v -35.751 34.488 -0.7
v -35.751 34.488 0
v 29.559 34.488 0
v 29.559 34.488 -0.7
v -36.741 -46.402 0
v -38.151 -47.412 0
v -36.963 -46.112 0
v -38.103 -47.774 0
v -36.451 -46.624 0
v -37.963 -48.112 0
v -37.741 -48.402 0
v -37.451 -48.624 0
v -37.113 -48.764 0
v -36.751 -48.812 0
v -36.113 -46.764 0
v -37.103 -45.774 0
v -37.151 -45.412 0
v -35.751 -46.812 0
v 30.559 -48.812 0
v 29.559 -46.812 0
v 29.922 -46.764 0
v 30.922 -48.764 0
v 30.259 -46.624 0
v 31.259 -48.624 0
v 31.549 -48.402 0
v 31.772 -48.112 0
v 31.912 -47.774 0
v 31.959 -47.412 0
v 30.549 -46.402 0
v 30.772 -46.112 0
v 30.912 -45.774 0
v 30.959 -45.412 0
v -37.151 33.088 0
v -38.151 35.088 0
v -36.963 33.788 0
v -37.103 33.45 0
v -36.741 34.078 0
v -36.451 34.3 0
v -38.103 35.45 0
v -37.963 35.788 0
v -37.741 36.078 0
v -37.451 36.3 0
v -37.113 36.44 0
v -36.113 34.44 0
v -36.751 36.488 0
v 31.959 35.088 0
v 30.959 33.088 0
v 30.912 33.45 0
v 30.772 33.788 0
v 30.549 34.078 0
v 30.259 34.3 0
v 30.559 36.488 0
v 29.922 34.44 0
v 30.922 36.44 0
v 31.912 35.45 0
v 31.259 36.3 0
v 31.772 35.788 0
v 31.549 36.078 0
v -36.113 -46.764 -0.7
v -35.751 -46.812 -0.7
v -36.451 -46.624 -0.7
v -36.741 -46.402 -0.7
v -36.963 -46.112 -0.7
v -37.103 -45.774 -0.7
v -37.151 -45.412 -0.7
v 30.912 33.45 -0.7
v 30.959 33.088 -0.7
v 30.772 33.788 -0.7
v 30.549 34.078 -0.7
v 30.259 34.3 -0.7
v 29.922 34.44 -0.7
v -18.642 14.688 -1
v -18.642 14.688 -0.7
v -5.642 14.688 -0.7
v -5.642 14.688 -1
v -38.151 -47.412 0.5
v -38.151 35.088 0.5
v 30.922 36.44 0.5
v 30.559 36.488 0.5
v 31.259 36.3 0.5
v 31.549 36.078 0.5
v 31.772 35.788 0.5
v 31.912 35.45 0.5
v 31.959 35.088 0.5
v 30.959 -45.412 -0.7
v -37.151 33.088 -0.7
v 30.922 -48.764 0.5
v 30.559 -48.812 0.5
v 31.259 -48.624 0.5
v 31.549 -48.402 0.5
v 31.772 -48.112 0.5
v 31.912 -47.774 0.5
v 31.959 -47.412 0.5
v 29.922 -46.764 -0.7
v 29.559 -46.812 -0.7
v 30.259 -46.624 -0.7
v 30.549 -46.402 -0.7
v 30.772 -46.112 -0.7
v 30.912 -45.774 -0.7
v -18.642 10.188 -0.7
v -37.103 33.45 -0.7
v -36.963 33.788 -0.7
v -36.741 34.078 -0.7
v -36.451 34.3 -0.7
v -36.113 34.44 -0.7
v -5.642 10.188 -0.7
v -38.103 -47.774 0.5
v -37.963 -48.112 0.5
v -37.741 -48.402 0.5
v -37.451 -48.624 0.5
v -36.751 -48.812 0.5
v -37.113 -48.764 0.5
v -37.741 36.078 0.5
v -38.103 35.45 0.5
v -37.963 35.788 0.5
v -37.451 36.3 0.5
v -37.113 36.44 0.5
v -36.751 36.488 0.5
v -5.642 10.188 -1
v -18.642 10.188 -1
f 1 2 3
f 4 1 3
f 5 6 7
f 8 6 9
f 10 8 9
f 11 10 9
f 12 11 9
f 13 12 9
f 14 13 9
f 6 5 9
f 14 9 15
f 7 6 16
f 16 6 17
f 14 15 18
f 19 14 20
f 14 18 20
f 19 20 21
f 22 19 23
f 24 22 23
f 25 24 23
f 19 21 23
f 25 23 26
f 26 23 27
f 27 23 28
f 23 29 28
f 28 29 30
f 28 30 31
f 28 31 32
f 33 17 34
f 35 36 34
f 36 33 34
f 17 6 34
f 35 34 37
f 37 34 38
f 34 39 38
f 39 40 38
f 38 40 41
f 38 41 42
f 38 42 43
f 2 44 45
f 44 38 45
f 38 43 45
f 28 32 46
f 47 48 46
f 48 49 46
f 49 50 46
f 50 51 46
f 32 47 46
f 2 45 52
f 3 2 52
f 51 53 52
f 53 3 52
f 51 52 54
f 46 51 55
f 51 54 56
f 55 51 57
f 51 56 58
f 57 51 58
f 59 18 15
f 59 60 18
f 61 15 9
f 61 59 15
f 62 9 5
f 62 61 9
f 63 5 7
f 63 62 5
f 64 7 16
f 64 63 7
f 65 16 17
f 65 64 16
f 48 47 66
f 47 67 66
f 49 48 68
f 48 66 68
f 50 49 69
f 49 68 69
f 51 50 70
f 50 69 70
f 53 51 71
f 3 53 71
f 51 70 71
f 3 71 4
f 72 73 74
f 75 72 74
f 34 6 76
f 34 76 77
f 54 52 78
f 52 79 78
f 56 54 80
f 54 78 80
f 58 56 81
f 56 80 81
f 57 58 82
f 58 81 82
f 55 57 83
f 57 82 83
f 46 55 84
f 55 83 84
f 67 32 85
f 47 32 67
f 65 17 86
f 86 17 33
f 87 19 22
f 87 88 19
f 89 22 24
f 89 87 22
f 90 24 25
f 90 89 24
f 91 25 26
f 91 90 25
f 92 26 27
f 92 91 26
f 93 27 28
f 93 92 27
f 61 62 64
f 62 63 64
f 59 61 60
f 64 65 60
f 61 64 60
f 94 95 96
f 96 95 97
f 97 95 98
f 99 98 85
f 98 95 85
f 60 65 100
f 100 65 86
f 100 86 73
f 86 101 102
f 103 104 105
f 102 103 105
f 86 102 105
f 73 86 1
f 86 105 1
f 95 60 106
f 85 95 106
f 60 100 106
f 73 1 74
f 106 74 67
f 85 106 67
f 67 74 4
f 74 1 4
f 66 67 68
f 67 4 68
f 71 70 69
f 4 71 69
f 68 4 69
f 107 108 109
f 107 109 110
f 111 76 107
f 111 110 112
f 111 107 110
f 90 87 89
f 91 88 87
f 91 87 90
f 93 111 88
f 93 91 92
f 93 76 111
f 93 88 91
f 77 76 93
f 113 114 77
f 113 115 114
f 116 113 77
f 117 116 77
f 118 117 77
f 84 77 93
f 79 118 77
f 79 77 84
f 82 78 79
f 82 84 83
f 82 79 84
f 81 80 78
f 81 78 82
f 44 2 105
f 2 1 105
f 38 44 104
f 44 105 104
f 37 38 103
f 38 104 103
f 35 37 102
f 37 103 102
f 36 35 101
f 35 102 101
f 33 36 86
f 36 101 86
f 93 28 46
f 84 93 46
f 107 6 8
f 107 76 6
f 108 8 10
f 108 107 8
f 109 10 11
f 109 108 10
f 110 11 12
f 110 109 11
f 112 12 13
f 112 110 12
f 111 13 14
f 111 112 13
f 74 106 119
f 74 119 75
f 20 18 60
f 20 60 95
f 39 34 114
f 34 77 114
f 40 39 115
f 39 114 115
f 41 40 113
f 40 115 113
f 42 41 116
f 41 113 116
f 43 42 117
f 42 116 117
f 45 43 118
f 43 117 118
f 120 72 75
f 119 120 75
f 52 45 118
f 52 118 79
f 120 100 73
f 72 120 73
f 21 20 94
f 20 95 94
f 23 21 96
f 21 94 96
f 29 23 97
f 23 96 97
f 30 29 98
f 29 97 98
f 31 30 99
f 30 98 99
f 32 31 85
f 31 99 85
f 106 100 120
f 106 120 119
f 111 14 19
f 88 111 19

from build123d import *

# Parameters (mm, degrees)
SKETCH_1_W      = 70.11
SKETCH_1_H      = 85.3
EXTRUDE_1_DEPTH = 0.5
SKETCH_1_3_W    = 68.11
SKETCH_1_3_H    = 81.3
EXTRUDE_2_DEPTH = 0.7
FILLET_1_R      = 1.4
FILLET_2_R      = 1.4
SKETCH_1_4_W    = 13
SKETCH_1_4_H    = 4.5
EXTRUDE_3_DEPTH = 1


with BuildPart() as part:
    # 草图1 → 凸台-拉伸1 (new body)
    with BuildSketch(Plane.XY):
        with Locations((-3.095661812, -6.162041577)):
            Rectangle(SKETCH_1_W, SKETCH_1_H)
    extrude(amount=EXTRUDE_1_DEPTH)

    # 草图1<3> → 凸台-拉伸2 (add)
    with BuildSketch(Plane.XY):
        with Locations((-3.095661812, -6.162041577)):
            Rectangle(SKETCH_1_3_W, SKETCH_1_3_H)
    extrude(amount=-EXTRUDE_2_DEPTH)

    # 圆角1
    fillet_1_edges = [part.edges().sort_by_distance(p)[0] for p in [
        (-37.150661812, -46.812041577, -0.35),
        (-37.150661812, 34.487958423, -0.35),
        (30.959338188, 34.487958423, -0.35),
        (30.959338188, -46.812041577, -0.35),
    ]]
    fillet(fillet_1_edges, radius=FILLET_1_R)

    # 圆角2
    fillet_2_edges = [part.edges().sort_by_distance(p)[0] for p in [
        (-38.150661812, 36.487958423, 0.25),
        (31.959338188, 36.487958423, 0.25),
        (31.959338188, -48.812041577, 0.25),
        (-38.150661812, -48.812041577, 0.25),
    ]]
    fillet(fillet_2_edges, radius=FILLET_2_R)

    # 草图1<4> → 凸台-拉伸3 (add)
    with BuildSketch(Plane.XY):
        with Locations((-12.141661812, 12.437958423)):
            Rectangle(SKETCH_1_4_W, SKETCH_1_4_H)
    extrude(amount=-EXTRUDE_3_DEPTH)


solid = part.part
